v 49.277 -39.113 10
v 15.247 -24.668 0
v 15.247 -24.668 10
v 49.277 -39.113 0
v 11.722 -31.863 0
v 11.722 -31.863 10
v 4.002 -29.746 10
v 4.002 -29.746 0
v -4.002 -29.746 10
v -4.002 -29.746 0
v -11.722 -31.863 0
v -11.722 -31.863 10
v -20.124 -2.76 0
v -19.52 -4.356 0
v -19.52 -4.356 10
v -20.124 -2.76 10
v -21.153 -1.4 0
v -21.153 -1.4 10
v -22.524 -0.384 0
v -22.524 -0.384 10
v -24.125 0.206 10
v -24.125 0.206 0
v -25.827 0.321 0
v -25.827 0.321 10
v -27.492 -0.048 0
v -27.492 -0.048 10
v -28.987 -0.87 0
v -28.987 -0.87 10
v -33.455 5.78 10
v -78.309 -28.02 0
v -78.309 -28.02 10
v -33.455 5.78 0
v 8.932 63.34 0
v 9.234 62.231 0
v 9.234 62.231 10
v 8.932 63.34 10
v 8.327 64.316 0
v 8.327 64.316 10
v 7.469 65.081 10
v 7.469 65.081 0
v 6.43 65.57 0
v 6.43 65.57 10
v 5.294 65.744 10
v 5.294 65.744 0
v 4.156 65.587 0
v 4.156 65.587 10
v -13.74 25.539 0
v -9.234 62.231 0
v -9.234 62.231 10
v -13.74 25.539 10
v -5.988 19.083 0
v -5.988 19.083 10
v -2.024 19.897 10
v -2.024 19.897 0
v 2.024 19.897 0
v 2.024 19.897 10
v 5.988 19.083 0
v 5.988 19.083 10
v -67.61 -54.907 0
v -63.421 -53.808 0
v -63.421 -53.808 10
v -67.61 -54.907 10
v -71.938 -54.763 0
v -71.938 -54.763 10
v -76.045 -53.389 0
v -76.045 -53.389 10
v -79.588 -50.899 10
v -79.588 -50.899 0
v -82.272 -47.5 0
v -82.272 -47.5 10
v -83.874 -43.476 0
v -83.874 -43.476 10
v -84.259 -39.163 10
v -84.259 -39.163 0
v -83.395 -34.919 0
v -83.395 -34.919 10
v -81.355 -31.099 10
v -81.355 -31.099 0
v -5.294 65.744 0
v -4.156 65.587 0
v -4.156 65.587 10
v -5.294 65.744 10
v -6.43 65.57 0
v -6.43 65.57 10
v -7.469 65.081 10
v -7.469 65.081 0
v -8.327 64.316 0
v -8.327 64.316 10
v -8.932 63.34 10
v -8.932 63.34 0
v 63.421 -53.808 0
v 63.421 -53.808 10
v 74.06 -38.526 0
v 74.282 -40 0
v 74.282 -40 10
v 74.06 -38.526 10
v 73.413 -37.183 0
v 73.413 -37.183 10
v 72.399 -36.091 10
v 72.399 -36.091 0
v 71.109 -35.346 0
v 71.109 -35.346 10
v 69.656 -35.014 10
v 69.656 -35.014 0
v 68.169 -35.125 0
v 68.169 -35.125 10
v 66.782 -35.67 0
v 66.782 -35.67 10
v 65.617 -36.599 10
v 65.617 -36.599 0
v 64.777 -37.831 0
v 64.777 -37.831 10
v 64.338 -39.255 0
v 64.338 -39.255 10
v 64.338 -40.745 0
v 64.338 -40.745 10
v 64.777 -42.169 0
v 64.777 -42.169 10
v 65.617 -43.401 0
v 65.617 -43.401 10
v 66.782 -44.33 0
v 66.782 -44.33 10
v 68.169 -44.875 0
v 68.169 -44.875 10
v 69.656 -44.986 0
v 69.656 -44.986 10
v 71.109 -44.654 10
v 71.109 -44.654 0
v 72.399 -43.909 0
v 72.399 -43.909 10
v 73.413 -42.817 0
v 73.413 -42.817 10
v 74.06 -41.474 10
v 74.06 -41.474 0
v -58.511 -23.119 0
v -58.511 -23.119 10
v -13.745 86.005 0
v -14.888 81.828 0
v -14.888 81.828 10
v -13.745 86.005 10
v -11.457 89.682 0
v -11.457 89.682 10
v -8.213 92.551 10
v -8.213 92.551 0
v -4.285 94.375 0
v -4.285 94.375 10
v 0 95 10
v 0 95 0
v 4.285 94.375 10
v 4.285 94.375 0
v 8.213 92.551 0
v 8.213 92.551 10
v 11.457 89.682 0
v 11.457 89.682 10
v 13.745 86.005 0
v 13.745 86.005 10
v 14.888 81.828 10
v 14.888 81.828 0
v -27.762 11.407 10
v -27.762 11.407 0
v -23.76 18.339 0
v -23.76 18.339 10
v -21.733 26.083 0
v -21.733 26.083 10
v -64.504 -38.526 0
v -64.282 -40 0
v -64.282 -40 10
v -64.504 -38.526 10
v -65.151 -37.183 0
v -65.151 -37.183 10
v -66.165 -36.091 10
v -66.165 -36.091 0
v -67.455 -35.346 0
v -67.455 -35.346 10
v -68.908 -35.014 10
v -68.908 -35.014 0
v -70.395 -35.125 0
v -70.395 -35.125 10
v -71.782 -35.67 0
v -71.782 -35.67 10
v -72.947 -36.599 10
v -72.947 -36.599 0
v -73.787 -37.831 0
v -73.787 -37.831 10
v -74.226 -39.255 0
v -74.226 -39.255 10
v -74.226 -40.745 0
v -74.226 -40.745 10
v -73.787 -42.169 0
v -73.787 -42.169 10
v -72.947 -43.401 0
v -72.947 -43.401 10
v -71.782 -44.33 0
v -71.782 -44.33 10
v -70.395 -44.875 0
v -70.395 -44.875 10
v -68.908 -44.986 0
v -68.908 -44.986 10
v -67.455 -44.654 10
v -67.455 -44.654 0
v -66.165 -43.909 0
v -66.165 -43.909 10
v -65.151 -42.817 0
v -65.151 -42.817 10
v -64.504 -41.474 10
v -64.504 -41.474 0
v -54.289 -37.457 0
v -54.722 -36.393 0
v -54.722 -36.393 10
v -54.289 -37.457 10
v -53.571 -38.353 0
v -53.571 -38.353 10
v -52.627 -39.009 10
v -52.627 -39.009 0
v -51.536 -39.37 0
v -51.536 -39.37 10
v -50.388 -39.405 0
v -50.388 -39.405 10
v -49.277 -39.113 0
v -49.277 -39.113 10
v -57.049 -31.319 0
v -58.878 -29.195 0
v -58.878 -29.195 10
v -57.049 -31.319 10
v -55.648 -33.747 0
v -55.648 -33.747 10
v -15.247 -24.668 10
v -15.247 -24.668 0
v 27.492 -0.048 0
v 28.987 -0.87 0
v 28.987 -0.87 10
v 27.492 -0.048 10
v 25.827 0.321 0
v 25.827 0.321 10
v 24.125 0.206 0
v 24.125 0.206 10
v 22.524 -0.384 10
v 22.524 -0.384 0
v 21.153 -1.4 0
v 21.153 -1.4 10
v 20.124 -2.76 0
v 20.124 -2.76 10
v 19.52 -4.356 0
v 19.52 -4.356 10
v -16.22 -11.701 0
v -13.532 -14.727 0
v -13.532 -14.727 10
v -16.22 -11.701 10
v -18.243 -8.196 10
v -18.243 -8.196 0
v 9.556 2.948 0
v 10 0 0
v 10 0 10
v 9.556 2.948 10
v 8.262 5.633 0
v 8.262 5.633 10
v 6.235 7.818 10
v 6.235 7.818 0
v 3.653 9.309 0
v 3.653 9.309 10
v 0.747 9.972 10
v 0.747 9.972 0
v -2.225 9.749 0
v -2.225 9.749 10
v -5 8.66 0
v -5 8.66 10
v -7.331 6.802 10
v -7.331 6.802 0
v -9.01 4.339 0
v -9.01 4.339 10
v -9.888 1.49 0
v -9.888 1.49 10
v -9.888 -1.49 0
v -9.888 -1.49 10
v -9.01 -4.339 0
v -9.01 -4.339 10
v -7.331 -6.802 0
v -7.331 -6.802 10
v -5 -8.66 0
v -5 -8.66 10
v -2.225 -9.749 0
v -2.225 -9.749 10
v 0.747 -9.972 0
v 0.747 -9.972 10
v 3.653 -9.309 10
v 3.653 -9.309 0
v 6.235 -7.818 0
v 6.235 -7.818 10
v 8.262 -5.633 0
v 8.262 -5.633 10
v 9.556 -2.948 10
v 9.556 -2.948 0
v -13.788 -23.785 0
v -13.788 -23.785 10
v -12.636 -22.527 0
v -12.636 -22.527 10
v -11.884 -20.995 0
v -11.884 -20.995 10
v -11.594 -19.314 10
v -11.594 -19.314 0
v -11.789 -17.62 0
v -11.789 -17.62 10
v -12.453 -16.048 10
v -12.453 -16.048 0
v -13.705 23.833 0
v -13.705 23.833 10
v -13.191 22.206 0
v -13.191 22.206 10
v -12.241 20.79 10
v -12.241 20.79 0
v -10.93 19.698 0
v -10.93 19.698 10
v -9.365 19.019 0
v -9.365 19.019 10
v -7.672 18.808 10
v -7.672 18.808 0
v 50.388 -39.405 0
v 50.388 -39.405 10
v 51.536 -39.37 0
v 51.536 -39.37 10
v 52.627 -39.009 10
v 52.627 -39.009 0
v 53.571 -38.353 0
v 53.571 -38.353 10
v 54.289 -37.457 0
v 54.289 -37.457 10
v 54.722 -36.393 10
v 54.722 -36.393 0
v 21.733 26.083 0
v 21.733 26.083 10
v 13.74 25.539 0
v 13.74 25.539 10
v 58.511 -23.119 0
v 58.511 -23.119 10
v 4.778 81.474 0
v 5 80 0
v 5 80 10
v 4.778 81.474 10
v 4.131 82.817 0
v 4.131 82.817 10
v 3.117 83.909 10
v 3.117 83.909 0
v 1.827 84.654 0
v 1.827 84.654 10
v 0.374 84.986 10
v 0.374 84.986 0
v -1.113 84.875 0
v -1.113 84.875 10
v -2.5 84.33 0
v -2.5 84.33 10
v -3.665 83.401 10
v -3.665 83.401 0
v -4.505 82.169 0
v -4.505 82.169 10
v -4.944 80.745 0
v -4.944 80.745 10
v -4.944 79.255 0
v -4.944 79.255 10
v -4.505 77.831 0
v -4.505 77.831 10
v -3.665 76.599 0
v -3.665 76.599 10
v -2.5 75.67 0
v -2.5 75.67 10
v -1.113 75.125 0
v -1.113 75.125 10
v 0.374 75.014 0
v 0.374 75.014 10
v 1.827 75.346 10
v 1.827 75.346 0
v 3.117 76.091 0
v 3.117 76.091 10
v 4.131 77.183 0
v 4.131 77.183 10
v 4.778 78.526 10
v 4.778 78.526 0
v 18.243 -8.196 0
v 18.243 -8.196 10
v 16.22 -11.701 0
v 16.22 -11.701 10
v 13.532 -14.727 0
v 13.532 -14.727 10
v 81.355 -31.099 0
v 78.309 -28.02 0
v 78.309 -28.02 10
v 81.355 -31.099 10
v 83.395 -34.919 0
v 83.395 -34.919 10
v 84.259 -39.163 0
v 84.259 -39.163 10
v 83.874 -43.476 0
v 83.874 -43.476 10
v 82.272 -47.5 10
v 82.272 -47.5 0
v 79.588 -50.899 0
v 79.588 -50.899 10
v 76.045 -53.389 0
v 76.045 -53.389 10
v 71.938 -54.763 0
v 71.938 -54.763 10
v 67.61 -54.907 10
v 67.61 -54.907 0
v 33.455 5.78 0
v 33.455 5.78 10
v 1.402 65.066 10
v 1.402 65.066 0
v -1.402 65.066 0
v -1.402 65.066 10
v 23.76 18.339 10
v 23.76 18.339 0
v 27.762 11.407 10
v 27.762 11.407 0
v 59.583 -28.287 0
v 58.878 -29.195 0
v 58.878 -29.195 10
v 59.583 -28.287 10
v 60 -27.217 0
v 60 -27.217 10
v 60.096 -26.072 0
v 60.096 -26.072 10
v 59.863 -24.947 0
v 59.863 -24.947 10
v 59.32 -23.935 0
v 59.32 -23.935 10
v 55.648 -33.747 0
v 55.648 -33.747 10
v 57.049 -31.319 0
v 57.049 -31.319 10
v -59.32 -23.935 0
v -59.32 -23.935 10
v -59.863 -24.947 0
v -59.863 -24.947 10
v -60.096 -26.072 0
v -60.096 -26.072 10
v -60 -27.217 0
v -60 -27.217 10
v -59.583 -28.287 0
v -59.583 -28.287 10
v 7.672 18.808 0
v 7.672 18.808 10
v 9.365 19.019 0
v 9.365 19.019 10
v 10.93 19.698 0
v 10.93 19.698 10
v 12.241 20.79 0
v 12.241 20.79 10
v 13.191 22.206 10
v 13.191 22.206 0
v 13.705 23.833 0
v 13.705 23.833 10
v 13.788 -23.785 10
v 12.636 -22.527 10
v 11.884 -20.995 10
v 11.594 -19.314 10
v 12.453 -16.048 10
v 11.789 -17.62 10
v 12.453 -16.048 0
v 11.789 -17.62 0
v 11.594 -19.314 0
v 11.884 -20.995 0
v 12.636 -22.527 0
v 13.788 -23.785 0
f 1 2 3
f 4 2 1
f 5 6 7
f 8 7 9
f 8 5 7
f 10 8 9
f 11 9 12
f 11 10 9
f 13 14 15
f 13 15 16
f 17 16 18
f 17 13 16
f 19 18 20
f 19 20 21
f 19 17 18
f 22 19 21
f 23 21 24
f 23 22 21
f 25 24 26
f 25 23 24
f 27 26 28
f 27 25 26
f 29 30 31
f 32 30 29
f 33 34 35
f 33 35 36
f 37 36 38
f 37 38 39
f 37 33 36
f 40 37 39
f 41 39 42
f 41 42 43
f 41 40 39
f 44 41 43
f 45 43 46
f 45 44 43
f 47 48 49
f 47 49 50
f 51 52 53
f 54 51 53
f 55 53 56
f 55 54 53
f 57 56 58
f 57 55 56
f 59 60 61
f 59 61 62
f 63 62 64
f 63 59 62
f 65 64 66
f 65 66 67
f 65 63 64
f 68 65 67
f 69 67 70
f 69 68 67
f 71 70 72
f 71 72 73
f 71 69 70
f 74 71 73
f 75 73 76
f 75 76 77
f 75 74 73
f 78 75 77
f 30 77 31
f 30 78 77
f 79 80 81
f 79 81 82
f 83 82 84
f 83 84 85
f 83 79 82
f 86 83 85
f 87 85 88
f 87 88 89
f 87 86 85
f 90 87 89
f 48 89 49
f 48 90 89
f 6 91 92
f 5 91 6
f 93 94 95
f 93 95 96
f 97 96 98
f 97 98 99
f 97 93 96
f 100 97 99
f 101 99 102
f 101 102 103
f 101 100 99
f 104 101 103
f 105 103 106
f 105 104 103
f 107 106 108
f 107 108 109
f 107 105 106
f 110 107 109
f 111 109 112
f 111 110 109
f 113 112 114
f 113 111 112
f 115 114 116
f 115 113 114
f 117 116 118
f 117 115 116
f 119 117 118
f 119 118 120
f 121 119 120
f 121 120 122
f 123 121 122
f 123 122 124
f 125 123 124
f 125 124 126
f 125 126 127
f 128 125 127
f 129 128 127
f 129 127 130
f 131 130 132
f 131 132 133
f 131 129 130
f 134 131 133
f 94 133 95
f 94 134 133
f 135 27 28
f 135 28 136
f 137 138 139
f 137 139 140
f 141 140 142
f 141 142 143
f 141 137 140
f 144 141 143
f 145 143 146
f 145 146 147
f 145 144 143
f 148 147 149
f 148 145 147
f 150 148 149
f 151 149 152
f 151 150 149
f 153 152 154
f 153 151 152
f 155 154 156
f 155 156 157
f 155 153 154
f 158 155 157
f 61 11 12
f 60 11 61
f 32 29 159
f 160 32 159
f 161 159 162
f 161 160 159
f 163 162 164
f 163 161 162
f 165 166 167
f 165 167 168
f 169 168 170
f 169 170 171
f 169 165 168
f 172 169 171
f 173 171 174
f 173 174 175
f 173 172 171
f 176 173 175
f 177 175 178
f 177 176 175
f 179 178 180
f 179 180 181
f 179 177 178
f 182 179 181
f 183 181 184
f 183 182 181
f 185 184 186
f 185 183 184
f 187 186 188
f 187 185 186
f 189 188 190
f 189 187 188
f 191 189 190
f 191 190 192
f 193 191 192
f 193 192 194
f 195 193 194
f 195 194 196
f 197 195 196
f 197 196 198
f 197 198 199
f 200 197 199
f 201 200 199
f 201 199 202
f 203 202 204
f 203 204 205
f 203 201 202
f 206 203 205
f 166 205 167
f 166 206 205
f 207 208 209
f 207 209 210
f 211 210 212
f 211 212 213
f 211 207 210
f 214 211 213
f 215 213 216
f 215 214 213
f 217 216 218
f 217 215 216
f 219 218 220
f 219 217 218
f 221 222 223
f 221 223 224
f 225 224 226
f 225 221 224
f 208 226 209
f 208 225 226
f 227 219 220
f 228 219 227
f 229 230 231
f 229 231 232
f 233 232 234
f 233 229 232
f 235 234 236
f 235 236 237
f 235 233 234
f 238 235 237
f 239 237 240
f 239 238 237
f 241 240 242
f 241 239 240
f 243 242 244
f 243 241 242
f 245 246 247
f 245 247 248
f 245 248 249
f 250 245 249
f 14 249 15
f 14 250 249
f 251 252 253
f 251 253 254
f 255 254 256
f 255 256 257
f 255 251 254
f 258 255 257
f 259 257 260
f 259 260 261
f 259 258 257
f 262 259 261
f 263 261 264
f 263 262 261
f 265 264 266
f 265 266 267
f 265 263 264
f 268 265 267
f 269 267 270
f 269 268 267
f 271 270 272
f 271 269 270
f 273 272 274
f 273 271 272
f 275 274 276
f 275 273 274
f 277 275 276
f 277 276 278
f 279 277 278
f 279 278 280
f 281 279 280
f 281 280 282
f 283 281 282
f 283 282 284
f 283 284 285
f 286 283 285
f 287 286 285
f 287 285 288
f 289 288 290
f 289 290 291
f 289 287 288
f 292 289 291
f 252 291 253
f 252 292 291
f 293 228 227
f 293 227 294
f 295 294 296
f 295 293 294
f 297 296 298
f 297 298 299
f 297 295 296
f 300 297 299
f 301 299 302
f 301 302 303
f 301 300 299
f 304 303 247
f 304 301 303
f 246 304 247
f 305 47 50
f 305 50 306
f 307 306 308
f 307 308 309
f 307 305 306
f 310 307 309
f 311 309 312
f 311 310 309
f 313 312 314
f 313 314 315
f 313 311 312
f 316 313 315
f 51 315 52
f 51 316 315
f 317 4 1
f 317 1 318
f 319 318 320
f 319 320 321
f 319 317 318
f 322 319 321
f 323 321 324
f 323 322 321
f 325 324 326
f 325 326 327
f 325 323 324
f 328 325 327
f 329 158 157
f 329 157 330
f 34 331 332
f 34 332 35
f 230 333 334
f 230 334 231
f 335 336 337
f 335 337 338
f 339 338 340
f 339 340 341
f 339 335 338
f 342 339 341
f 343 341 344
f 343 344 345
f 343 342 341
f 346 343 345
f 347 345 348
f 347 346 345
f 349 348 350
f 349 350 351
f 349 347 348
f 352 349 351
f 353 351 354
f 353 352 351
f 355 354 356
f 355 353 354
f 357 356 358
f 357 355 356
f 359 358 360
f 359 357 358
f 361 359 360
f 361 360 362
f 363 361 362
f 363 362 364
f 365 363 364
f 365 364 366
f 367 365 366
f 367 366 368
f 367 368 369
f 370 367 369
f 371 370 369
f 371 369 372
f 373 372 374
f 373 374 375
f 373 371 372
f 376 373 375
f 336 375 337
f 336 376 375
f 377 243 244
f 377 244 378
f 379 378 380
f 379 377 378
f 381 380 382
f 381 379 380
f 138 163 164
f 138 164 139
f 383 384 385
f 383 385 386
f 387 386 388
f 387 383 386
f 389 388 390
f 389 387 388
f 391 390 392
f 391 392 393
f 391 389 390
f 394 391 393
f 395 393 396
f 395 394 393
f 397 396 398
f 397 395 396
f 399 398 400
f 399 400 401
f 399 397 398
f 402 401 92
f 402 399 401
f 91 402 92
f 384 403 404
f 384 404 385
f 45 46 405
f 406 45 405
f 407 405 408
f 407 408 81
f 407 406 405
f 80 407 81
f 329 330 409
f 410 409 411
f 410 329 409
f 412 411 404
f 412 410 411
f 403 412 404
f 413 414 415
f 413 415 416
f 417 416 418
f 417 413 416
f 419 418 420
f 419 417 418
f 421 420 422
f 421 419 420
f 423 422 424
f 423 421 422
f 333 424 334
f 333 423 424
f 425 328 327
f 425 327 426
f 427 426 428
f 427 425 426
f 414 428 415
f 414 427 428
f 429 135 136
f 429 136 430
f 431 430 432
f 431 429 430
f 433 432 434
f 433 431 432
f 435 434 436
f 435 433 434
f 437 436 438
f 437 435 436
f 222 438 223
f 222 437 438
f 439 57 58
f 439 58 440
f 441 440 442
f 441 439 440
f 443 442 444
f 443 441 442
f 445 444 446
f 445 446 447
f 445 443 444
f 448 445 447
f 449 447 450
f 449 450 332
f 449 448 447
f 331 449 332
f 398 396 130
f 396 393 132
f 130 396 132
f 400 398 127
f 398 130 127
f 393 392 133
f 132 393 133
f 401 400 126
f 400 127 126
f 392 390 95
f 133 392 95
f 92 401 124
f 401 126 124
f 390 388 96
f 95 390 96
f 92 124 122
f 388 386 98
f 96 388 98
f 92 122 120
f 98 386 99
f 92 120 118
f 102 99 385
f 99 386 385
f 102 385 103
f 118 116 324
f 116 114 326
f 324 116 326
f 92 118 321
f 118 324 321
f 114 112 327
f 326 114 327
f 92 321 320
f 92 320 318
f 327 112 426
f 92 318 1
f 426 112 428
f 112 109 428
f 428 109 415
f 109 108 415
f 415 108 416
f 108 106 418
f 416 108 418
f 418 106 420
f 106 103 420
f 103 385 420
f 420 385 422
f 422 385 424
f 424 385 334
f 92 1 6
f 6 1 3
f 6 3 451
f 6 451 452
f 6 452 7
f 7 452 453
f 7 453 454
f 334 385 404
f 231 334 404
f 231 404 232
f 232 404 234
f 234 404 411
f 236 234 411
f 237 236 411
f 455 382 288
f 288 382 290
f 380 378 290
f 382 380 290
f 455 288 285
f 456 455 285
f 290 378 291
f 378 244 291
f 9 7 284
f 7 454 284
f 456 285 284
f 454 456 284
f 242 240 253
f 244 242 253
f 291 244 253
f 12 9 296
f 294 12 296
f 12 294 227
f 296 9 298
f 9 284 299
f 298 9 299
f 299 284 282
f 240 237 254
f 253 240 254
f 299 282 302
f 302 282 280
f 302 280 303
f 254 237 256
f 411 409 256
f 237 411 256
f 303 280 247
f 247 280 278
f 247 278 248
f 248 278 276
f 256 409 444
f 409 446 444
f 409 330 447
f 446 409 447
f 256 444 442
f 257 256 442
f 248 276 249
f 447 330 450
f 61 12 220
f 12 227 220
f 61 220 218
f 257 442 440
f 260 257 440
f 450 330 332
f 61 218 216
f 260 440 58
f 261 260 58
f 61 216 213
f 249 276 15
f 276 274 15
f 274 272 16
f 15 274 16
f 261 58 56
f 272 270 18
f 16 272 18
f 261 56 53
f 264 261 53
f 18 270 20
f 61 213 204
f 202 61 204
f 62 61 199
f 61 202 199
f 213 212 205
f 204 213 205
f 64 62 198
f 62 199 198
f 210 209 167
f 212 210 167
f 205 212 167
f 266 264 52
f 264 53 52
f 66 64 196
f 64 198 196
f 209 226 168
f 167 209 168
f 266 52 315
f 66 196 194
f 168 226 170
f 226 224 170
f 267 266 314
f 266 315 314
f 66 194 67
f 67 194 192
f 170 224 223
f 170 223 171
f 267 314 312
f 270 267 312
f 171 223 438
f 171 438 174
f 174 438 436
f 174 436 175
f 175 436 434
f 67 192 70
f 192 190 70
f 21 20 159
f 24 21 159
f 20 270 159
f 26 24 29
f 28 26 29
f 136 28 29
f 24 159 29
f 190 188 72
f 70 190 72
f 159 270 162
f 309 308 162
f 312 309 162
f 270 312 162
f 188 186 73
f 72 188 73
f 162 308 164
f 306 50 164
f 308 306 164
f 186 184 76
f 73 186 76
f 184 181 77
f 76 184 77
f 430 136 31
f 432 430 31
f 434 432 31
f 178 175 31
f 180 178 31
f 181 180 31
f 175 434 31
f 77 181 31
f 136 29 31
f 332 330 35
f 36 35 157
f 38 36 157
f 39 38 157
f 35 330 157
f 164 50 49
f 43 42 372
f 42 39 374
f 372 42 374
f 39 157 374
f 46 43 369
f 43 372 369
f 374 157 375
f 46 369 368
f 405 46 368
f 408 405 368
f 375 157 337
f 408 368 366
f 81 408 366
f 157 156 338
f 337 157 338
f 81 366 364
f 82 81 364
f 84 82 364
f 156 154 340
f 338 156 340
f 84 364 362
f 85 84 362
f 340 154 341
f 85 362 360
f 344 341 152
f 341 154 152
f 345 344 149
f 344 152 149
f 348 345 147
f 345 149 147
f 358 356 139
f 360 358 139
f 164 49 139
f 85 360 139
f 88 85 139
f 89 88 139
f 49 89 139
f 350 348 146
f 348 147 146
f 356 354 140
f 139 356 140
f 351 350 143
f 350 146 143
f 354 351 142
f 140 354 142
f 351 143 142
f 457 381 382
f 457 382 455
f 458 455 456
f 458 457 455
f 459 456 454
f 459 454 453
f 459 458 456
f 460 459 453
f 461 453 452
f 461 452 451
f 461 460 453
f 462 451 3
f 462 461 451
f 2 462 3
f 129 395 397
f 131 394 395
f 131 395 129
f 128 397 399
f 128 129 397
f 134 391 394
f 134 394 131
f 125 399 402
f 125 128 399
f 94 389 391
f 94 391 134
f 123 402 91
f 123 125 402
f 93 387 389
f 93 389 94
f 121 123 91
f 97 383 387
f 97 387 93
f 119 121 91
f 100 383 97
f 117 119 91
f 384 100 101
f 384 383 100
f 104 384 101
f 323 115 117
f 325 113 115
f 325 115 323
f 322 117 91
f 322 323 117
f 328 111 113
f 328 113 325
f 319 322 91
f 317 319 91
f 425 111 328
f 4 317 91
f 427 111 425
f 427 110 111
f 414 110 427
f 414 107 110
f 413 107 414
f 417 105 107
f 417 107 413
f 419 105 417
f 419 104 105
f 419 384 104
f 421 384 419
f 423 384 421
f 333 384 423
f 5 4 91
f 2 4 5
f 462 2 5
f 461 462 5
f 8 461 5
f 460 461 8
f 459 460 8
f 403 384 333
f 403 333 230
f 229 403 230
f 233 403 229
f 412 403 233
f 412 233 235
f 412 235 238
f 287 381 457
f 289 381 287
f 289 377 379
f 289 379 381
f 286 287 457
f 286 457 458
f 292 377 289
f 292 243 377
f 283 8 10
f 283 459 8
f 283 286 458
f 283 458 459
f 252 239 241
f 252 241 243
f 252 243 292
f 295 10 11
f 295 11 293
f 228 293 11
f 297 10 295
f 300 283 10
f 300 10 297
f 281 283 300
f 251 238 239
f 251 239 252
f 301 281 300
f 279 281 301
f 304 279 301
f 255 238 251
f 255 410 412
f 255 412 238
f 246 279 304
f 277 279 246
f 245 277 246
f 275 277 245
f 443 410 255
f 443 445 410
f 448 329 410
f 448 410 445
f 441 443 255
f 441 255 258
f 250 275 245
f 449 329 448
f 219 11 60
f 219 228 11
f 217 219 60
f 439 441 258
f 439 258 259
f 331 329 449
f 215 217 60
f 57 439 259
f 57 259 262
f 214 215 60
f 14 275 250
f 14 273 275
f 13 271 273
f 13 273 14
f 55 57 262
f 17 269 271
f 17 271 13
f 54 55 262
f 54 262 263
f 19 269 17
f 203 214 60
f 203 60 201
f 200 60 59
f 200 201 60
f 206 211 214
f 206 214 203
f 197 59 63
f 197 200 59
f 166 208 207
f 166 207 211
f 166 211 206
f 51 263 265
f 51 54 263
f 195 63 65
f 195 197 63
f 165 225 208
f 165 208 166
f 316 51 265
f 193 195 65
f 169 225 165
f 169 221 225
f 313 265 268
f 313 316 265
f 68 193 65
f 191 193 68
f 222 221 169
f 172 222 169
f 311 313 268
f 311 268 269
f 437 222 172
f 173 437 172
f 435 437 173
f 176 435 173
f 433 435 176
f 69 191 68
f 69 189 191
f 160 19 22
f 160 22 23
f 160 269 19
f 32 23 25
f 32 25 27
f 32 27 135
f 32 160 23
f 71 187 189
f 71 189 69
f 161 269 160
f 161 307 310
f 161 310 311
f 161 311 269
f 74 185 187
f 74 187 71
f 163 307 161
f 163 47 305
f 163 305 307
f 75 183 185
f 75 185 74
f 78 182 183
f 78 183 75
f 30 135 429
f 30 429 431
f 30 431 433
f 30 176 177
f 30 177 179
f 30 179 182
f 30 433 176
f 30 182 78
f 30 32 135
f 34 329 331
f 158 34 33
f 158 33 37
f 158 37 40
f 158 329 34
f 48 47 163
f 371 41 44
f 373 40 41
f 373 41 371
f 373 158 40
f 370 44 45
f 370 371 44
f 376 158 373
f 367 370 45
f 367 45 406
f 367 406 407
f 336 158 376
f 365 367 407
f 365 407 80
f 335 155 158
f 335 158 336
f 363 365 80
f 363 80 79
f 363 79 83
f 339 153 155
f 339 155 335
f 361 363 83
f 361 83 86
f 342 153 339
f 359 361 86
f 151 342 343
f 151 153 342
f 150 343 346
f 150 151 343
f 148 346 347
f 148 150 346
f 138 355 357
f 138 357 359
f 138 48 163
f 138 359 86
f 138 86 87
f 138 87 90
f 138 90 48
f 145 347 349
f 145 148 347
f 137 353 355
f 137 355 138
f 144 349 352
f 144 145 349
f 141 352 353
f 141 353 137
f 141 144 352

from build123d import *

# Parameters (mm, degrees)
SKETCH1_R           = 5
SKETCH1_R_2         = 10
BOSS_EXTRUDE1_DEPTH = 10


with BuildPart() as part:
    # Sketch1 → Boss-Extrude1 (new body)
    with BuildSketch(Plane.XY):
        with BuildLine():
            ThreePointArc((-33.454782287, 5.779804226), (-25.528470868, 14.738869527), (-21.732848432, 26.082789225))
            Line((-21.732848432, 26.082789225), (-14.888192275, 81.828040151))
            ThreePointArc((-14.888192275, 81.828040151), (0, 95), (14.888192275, 81.828040151))
            Line((14.888192275, 81.828040151), (21.732848432, 26.082789225))
            ThreePointArc((21.732848432, 26.082789225), (25.528470868, 14.738869527), (33.454782287, 5.779804226))
            Line((33.454782287, 5.779804226), (78.30925765, -28.020467349))
            ThreePointArc((78.30925765, -28.020467349), (82.27241336, -47.5), (63.421065375, -53.807572802))
            Line((63.421065375, -53.807572802), (11.721933855, -31.862593451))
            ThreePointArc((11.721933855, -31.862593451), (0, -29.477739055), (-11.721933855, -31.862593451))
            Line((-11.721933855, -31.862593451), (-63.421065375, -53.807572802))
            ThreePointArc((-63.421065375, -53.807572802), (-82.27241336, -47.5), (-78.30925765, -28.020467349))
            Line((-78.30925765, -28.020467349), (-33.454782287, 5.779804226))
        make_face()
        with Locations((-69.282032303, -40)):
            Circle(SKETCH1_R, mode=Mode.SUBTRACT)
        with Locations((69.282032303, -40)):
            Circle(SKETCH1_R, mode=Mode.SUBTRACT)
        with Locations((0, 80)):
            Circle(SKETCH1_R, mode=Mode.SUBTRACT)
        Circle(SKETCH1_R_2, mode=Mode.SUBTRACT)
        with BuildLine():
            ThreePointArc((-4.155876324, 65.587203881), (-7.469391302, 65.0809662), (-9.234294617, 62.231268956))
            Line((-9.234294617, 62.231268956), (-13.739592483, 25.538562373))
            ThreePointArc((-13.739592483, 25.538562373), (-11.624113874, 20.196928868), (-5.987935057, 19.082574086))
            ThreePointArc((-5.987935057, 19.082574086), (0, 20), (5.987935057, 19.082574086))
            ThreePointArc((5.987935057, 19.082574086), (11.624113874, 20.196928868), (13.739592483, 25.538562373))
            Line((13.739592483, 25.538562373), (9.234294617, 62.231268956))
            ThreePointArc((9.234294617, 62.231268956), (7.469391302, 65.0809662), (4.155876324, 65.587203881))
            ThreePointArc((4.155876324, 65.587203881), (0, 65), (-4.155876324, 65.587203881))
        make_face(mode=Mode.SUBTRACT)
        with BuildLine():
            ThreePointArc((58.878122886, -29.194507469), (60.096465683, -26.071800482), (58.511007134, -23.118500753))
            Line((58.511007134, -23.118500753), (28.986840033, -0.870445058))
            ThreePointArc((28.986840033, -0.870445058), (23.303110415, -0.031686522), (19.519961457, -4.355583168))
            ThreePointArc((19.519961457, -4.355583168), (17.320508076, -10), (13.5320264, -14.726990918))
            ThreePointArc((13.5320264, -14.726990918), (11.678996541, -20.165242346), (15.247247549, -24.668117315))
            Line((15.247247549, -24.668117315), (49.276712517, -39.112768202))
            ThreePointArc((49.276712517, -39.112768202), (52.627074381, -39.009165718), (54.722246562, -36.392696412))
            ThreePointArc((54.722246562, -36.392696412), (56.291651246, -32.5), (58.878122886, -29.194507469))
        make_face(mode=Mode.SUBTRACT)
        with BuildLine():
            ThreePointArc((-54.722246562, -36.392696412), (-52.627074381, -39.009165718), (-49.276712517, -39.112768202))
            Line((-49.276712517, -39.112768202), (-15.247247549, -24.668117315))
            ThreePointArc((-15.247247549, -24.668117315), (-11.678996541, -20.165242346), (-13.5320264, -14.726990918))
            ThreePointArc((-13.5320264, -14.726990918), (-17.320508076, -10), (-19.519961457, -4.355583168))
            ThreePointArc((-19.519961457, -4.355583168), (-23.303110415, -0.031686522), (-28.986840033, -0.870445058))
            Line((-28.986840033, -0.870445058), (-58.511007134, -23.118500753))
            ThreePointArc((-58.511007134, -23.118500753), (-60.096465683, -26.071800482), (-58.878122886, -29.194507469))
            ThreePointArc((-58.878122886, -29.194507469), (-56.291651246, -32.5), (-54.722246562, -36.392696412))
        make_face(mode=Mode.SUBTRACT)
    extrude(amount=BOSS_EXTRUDE1_DEPTH)


solid = part.part
